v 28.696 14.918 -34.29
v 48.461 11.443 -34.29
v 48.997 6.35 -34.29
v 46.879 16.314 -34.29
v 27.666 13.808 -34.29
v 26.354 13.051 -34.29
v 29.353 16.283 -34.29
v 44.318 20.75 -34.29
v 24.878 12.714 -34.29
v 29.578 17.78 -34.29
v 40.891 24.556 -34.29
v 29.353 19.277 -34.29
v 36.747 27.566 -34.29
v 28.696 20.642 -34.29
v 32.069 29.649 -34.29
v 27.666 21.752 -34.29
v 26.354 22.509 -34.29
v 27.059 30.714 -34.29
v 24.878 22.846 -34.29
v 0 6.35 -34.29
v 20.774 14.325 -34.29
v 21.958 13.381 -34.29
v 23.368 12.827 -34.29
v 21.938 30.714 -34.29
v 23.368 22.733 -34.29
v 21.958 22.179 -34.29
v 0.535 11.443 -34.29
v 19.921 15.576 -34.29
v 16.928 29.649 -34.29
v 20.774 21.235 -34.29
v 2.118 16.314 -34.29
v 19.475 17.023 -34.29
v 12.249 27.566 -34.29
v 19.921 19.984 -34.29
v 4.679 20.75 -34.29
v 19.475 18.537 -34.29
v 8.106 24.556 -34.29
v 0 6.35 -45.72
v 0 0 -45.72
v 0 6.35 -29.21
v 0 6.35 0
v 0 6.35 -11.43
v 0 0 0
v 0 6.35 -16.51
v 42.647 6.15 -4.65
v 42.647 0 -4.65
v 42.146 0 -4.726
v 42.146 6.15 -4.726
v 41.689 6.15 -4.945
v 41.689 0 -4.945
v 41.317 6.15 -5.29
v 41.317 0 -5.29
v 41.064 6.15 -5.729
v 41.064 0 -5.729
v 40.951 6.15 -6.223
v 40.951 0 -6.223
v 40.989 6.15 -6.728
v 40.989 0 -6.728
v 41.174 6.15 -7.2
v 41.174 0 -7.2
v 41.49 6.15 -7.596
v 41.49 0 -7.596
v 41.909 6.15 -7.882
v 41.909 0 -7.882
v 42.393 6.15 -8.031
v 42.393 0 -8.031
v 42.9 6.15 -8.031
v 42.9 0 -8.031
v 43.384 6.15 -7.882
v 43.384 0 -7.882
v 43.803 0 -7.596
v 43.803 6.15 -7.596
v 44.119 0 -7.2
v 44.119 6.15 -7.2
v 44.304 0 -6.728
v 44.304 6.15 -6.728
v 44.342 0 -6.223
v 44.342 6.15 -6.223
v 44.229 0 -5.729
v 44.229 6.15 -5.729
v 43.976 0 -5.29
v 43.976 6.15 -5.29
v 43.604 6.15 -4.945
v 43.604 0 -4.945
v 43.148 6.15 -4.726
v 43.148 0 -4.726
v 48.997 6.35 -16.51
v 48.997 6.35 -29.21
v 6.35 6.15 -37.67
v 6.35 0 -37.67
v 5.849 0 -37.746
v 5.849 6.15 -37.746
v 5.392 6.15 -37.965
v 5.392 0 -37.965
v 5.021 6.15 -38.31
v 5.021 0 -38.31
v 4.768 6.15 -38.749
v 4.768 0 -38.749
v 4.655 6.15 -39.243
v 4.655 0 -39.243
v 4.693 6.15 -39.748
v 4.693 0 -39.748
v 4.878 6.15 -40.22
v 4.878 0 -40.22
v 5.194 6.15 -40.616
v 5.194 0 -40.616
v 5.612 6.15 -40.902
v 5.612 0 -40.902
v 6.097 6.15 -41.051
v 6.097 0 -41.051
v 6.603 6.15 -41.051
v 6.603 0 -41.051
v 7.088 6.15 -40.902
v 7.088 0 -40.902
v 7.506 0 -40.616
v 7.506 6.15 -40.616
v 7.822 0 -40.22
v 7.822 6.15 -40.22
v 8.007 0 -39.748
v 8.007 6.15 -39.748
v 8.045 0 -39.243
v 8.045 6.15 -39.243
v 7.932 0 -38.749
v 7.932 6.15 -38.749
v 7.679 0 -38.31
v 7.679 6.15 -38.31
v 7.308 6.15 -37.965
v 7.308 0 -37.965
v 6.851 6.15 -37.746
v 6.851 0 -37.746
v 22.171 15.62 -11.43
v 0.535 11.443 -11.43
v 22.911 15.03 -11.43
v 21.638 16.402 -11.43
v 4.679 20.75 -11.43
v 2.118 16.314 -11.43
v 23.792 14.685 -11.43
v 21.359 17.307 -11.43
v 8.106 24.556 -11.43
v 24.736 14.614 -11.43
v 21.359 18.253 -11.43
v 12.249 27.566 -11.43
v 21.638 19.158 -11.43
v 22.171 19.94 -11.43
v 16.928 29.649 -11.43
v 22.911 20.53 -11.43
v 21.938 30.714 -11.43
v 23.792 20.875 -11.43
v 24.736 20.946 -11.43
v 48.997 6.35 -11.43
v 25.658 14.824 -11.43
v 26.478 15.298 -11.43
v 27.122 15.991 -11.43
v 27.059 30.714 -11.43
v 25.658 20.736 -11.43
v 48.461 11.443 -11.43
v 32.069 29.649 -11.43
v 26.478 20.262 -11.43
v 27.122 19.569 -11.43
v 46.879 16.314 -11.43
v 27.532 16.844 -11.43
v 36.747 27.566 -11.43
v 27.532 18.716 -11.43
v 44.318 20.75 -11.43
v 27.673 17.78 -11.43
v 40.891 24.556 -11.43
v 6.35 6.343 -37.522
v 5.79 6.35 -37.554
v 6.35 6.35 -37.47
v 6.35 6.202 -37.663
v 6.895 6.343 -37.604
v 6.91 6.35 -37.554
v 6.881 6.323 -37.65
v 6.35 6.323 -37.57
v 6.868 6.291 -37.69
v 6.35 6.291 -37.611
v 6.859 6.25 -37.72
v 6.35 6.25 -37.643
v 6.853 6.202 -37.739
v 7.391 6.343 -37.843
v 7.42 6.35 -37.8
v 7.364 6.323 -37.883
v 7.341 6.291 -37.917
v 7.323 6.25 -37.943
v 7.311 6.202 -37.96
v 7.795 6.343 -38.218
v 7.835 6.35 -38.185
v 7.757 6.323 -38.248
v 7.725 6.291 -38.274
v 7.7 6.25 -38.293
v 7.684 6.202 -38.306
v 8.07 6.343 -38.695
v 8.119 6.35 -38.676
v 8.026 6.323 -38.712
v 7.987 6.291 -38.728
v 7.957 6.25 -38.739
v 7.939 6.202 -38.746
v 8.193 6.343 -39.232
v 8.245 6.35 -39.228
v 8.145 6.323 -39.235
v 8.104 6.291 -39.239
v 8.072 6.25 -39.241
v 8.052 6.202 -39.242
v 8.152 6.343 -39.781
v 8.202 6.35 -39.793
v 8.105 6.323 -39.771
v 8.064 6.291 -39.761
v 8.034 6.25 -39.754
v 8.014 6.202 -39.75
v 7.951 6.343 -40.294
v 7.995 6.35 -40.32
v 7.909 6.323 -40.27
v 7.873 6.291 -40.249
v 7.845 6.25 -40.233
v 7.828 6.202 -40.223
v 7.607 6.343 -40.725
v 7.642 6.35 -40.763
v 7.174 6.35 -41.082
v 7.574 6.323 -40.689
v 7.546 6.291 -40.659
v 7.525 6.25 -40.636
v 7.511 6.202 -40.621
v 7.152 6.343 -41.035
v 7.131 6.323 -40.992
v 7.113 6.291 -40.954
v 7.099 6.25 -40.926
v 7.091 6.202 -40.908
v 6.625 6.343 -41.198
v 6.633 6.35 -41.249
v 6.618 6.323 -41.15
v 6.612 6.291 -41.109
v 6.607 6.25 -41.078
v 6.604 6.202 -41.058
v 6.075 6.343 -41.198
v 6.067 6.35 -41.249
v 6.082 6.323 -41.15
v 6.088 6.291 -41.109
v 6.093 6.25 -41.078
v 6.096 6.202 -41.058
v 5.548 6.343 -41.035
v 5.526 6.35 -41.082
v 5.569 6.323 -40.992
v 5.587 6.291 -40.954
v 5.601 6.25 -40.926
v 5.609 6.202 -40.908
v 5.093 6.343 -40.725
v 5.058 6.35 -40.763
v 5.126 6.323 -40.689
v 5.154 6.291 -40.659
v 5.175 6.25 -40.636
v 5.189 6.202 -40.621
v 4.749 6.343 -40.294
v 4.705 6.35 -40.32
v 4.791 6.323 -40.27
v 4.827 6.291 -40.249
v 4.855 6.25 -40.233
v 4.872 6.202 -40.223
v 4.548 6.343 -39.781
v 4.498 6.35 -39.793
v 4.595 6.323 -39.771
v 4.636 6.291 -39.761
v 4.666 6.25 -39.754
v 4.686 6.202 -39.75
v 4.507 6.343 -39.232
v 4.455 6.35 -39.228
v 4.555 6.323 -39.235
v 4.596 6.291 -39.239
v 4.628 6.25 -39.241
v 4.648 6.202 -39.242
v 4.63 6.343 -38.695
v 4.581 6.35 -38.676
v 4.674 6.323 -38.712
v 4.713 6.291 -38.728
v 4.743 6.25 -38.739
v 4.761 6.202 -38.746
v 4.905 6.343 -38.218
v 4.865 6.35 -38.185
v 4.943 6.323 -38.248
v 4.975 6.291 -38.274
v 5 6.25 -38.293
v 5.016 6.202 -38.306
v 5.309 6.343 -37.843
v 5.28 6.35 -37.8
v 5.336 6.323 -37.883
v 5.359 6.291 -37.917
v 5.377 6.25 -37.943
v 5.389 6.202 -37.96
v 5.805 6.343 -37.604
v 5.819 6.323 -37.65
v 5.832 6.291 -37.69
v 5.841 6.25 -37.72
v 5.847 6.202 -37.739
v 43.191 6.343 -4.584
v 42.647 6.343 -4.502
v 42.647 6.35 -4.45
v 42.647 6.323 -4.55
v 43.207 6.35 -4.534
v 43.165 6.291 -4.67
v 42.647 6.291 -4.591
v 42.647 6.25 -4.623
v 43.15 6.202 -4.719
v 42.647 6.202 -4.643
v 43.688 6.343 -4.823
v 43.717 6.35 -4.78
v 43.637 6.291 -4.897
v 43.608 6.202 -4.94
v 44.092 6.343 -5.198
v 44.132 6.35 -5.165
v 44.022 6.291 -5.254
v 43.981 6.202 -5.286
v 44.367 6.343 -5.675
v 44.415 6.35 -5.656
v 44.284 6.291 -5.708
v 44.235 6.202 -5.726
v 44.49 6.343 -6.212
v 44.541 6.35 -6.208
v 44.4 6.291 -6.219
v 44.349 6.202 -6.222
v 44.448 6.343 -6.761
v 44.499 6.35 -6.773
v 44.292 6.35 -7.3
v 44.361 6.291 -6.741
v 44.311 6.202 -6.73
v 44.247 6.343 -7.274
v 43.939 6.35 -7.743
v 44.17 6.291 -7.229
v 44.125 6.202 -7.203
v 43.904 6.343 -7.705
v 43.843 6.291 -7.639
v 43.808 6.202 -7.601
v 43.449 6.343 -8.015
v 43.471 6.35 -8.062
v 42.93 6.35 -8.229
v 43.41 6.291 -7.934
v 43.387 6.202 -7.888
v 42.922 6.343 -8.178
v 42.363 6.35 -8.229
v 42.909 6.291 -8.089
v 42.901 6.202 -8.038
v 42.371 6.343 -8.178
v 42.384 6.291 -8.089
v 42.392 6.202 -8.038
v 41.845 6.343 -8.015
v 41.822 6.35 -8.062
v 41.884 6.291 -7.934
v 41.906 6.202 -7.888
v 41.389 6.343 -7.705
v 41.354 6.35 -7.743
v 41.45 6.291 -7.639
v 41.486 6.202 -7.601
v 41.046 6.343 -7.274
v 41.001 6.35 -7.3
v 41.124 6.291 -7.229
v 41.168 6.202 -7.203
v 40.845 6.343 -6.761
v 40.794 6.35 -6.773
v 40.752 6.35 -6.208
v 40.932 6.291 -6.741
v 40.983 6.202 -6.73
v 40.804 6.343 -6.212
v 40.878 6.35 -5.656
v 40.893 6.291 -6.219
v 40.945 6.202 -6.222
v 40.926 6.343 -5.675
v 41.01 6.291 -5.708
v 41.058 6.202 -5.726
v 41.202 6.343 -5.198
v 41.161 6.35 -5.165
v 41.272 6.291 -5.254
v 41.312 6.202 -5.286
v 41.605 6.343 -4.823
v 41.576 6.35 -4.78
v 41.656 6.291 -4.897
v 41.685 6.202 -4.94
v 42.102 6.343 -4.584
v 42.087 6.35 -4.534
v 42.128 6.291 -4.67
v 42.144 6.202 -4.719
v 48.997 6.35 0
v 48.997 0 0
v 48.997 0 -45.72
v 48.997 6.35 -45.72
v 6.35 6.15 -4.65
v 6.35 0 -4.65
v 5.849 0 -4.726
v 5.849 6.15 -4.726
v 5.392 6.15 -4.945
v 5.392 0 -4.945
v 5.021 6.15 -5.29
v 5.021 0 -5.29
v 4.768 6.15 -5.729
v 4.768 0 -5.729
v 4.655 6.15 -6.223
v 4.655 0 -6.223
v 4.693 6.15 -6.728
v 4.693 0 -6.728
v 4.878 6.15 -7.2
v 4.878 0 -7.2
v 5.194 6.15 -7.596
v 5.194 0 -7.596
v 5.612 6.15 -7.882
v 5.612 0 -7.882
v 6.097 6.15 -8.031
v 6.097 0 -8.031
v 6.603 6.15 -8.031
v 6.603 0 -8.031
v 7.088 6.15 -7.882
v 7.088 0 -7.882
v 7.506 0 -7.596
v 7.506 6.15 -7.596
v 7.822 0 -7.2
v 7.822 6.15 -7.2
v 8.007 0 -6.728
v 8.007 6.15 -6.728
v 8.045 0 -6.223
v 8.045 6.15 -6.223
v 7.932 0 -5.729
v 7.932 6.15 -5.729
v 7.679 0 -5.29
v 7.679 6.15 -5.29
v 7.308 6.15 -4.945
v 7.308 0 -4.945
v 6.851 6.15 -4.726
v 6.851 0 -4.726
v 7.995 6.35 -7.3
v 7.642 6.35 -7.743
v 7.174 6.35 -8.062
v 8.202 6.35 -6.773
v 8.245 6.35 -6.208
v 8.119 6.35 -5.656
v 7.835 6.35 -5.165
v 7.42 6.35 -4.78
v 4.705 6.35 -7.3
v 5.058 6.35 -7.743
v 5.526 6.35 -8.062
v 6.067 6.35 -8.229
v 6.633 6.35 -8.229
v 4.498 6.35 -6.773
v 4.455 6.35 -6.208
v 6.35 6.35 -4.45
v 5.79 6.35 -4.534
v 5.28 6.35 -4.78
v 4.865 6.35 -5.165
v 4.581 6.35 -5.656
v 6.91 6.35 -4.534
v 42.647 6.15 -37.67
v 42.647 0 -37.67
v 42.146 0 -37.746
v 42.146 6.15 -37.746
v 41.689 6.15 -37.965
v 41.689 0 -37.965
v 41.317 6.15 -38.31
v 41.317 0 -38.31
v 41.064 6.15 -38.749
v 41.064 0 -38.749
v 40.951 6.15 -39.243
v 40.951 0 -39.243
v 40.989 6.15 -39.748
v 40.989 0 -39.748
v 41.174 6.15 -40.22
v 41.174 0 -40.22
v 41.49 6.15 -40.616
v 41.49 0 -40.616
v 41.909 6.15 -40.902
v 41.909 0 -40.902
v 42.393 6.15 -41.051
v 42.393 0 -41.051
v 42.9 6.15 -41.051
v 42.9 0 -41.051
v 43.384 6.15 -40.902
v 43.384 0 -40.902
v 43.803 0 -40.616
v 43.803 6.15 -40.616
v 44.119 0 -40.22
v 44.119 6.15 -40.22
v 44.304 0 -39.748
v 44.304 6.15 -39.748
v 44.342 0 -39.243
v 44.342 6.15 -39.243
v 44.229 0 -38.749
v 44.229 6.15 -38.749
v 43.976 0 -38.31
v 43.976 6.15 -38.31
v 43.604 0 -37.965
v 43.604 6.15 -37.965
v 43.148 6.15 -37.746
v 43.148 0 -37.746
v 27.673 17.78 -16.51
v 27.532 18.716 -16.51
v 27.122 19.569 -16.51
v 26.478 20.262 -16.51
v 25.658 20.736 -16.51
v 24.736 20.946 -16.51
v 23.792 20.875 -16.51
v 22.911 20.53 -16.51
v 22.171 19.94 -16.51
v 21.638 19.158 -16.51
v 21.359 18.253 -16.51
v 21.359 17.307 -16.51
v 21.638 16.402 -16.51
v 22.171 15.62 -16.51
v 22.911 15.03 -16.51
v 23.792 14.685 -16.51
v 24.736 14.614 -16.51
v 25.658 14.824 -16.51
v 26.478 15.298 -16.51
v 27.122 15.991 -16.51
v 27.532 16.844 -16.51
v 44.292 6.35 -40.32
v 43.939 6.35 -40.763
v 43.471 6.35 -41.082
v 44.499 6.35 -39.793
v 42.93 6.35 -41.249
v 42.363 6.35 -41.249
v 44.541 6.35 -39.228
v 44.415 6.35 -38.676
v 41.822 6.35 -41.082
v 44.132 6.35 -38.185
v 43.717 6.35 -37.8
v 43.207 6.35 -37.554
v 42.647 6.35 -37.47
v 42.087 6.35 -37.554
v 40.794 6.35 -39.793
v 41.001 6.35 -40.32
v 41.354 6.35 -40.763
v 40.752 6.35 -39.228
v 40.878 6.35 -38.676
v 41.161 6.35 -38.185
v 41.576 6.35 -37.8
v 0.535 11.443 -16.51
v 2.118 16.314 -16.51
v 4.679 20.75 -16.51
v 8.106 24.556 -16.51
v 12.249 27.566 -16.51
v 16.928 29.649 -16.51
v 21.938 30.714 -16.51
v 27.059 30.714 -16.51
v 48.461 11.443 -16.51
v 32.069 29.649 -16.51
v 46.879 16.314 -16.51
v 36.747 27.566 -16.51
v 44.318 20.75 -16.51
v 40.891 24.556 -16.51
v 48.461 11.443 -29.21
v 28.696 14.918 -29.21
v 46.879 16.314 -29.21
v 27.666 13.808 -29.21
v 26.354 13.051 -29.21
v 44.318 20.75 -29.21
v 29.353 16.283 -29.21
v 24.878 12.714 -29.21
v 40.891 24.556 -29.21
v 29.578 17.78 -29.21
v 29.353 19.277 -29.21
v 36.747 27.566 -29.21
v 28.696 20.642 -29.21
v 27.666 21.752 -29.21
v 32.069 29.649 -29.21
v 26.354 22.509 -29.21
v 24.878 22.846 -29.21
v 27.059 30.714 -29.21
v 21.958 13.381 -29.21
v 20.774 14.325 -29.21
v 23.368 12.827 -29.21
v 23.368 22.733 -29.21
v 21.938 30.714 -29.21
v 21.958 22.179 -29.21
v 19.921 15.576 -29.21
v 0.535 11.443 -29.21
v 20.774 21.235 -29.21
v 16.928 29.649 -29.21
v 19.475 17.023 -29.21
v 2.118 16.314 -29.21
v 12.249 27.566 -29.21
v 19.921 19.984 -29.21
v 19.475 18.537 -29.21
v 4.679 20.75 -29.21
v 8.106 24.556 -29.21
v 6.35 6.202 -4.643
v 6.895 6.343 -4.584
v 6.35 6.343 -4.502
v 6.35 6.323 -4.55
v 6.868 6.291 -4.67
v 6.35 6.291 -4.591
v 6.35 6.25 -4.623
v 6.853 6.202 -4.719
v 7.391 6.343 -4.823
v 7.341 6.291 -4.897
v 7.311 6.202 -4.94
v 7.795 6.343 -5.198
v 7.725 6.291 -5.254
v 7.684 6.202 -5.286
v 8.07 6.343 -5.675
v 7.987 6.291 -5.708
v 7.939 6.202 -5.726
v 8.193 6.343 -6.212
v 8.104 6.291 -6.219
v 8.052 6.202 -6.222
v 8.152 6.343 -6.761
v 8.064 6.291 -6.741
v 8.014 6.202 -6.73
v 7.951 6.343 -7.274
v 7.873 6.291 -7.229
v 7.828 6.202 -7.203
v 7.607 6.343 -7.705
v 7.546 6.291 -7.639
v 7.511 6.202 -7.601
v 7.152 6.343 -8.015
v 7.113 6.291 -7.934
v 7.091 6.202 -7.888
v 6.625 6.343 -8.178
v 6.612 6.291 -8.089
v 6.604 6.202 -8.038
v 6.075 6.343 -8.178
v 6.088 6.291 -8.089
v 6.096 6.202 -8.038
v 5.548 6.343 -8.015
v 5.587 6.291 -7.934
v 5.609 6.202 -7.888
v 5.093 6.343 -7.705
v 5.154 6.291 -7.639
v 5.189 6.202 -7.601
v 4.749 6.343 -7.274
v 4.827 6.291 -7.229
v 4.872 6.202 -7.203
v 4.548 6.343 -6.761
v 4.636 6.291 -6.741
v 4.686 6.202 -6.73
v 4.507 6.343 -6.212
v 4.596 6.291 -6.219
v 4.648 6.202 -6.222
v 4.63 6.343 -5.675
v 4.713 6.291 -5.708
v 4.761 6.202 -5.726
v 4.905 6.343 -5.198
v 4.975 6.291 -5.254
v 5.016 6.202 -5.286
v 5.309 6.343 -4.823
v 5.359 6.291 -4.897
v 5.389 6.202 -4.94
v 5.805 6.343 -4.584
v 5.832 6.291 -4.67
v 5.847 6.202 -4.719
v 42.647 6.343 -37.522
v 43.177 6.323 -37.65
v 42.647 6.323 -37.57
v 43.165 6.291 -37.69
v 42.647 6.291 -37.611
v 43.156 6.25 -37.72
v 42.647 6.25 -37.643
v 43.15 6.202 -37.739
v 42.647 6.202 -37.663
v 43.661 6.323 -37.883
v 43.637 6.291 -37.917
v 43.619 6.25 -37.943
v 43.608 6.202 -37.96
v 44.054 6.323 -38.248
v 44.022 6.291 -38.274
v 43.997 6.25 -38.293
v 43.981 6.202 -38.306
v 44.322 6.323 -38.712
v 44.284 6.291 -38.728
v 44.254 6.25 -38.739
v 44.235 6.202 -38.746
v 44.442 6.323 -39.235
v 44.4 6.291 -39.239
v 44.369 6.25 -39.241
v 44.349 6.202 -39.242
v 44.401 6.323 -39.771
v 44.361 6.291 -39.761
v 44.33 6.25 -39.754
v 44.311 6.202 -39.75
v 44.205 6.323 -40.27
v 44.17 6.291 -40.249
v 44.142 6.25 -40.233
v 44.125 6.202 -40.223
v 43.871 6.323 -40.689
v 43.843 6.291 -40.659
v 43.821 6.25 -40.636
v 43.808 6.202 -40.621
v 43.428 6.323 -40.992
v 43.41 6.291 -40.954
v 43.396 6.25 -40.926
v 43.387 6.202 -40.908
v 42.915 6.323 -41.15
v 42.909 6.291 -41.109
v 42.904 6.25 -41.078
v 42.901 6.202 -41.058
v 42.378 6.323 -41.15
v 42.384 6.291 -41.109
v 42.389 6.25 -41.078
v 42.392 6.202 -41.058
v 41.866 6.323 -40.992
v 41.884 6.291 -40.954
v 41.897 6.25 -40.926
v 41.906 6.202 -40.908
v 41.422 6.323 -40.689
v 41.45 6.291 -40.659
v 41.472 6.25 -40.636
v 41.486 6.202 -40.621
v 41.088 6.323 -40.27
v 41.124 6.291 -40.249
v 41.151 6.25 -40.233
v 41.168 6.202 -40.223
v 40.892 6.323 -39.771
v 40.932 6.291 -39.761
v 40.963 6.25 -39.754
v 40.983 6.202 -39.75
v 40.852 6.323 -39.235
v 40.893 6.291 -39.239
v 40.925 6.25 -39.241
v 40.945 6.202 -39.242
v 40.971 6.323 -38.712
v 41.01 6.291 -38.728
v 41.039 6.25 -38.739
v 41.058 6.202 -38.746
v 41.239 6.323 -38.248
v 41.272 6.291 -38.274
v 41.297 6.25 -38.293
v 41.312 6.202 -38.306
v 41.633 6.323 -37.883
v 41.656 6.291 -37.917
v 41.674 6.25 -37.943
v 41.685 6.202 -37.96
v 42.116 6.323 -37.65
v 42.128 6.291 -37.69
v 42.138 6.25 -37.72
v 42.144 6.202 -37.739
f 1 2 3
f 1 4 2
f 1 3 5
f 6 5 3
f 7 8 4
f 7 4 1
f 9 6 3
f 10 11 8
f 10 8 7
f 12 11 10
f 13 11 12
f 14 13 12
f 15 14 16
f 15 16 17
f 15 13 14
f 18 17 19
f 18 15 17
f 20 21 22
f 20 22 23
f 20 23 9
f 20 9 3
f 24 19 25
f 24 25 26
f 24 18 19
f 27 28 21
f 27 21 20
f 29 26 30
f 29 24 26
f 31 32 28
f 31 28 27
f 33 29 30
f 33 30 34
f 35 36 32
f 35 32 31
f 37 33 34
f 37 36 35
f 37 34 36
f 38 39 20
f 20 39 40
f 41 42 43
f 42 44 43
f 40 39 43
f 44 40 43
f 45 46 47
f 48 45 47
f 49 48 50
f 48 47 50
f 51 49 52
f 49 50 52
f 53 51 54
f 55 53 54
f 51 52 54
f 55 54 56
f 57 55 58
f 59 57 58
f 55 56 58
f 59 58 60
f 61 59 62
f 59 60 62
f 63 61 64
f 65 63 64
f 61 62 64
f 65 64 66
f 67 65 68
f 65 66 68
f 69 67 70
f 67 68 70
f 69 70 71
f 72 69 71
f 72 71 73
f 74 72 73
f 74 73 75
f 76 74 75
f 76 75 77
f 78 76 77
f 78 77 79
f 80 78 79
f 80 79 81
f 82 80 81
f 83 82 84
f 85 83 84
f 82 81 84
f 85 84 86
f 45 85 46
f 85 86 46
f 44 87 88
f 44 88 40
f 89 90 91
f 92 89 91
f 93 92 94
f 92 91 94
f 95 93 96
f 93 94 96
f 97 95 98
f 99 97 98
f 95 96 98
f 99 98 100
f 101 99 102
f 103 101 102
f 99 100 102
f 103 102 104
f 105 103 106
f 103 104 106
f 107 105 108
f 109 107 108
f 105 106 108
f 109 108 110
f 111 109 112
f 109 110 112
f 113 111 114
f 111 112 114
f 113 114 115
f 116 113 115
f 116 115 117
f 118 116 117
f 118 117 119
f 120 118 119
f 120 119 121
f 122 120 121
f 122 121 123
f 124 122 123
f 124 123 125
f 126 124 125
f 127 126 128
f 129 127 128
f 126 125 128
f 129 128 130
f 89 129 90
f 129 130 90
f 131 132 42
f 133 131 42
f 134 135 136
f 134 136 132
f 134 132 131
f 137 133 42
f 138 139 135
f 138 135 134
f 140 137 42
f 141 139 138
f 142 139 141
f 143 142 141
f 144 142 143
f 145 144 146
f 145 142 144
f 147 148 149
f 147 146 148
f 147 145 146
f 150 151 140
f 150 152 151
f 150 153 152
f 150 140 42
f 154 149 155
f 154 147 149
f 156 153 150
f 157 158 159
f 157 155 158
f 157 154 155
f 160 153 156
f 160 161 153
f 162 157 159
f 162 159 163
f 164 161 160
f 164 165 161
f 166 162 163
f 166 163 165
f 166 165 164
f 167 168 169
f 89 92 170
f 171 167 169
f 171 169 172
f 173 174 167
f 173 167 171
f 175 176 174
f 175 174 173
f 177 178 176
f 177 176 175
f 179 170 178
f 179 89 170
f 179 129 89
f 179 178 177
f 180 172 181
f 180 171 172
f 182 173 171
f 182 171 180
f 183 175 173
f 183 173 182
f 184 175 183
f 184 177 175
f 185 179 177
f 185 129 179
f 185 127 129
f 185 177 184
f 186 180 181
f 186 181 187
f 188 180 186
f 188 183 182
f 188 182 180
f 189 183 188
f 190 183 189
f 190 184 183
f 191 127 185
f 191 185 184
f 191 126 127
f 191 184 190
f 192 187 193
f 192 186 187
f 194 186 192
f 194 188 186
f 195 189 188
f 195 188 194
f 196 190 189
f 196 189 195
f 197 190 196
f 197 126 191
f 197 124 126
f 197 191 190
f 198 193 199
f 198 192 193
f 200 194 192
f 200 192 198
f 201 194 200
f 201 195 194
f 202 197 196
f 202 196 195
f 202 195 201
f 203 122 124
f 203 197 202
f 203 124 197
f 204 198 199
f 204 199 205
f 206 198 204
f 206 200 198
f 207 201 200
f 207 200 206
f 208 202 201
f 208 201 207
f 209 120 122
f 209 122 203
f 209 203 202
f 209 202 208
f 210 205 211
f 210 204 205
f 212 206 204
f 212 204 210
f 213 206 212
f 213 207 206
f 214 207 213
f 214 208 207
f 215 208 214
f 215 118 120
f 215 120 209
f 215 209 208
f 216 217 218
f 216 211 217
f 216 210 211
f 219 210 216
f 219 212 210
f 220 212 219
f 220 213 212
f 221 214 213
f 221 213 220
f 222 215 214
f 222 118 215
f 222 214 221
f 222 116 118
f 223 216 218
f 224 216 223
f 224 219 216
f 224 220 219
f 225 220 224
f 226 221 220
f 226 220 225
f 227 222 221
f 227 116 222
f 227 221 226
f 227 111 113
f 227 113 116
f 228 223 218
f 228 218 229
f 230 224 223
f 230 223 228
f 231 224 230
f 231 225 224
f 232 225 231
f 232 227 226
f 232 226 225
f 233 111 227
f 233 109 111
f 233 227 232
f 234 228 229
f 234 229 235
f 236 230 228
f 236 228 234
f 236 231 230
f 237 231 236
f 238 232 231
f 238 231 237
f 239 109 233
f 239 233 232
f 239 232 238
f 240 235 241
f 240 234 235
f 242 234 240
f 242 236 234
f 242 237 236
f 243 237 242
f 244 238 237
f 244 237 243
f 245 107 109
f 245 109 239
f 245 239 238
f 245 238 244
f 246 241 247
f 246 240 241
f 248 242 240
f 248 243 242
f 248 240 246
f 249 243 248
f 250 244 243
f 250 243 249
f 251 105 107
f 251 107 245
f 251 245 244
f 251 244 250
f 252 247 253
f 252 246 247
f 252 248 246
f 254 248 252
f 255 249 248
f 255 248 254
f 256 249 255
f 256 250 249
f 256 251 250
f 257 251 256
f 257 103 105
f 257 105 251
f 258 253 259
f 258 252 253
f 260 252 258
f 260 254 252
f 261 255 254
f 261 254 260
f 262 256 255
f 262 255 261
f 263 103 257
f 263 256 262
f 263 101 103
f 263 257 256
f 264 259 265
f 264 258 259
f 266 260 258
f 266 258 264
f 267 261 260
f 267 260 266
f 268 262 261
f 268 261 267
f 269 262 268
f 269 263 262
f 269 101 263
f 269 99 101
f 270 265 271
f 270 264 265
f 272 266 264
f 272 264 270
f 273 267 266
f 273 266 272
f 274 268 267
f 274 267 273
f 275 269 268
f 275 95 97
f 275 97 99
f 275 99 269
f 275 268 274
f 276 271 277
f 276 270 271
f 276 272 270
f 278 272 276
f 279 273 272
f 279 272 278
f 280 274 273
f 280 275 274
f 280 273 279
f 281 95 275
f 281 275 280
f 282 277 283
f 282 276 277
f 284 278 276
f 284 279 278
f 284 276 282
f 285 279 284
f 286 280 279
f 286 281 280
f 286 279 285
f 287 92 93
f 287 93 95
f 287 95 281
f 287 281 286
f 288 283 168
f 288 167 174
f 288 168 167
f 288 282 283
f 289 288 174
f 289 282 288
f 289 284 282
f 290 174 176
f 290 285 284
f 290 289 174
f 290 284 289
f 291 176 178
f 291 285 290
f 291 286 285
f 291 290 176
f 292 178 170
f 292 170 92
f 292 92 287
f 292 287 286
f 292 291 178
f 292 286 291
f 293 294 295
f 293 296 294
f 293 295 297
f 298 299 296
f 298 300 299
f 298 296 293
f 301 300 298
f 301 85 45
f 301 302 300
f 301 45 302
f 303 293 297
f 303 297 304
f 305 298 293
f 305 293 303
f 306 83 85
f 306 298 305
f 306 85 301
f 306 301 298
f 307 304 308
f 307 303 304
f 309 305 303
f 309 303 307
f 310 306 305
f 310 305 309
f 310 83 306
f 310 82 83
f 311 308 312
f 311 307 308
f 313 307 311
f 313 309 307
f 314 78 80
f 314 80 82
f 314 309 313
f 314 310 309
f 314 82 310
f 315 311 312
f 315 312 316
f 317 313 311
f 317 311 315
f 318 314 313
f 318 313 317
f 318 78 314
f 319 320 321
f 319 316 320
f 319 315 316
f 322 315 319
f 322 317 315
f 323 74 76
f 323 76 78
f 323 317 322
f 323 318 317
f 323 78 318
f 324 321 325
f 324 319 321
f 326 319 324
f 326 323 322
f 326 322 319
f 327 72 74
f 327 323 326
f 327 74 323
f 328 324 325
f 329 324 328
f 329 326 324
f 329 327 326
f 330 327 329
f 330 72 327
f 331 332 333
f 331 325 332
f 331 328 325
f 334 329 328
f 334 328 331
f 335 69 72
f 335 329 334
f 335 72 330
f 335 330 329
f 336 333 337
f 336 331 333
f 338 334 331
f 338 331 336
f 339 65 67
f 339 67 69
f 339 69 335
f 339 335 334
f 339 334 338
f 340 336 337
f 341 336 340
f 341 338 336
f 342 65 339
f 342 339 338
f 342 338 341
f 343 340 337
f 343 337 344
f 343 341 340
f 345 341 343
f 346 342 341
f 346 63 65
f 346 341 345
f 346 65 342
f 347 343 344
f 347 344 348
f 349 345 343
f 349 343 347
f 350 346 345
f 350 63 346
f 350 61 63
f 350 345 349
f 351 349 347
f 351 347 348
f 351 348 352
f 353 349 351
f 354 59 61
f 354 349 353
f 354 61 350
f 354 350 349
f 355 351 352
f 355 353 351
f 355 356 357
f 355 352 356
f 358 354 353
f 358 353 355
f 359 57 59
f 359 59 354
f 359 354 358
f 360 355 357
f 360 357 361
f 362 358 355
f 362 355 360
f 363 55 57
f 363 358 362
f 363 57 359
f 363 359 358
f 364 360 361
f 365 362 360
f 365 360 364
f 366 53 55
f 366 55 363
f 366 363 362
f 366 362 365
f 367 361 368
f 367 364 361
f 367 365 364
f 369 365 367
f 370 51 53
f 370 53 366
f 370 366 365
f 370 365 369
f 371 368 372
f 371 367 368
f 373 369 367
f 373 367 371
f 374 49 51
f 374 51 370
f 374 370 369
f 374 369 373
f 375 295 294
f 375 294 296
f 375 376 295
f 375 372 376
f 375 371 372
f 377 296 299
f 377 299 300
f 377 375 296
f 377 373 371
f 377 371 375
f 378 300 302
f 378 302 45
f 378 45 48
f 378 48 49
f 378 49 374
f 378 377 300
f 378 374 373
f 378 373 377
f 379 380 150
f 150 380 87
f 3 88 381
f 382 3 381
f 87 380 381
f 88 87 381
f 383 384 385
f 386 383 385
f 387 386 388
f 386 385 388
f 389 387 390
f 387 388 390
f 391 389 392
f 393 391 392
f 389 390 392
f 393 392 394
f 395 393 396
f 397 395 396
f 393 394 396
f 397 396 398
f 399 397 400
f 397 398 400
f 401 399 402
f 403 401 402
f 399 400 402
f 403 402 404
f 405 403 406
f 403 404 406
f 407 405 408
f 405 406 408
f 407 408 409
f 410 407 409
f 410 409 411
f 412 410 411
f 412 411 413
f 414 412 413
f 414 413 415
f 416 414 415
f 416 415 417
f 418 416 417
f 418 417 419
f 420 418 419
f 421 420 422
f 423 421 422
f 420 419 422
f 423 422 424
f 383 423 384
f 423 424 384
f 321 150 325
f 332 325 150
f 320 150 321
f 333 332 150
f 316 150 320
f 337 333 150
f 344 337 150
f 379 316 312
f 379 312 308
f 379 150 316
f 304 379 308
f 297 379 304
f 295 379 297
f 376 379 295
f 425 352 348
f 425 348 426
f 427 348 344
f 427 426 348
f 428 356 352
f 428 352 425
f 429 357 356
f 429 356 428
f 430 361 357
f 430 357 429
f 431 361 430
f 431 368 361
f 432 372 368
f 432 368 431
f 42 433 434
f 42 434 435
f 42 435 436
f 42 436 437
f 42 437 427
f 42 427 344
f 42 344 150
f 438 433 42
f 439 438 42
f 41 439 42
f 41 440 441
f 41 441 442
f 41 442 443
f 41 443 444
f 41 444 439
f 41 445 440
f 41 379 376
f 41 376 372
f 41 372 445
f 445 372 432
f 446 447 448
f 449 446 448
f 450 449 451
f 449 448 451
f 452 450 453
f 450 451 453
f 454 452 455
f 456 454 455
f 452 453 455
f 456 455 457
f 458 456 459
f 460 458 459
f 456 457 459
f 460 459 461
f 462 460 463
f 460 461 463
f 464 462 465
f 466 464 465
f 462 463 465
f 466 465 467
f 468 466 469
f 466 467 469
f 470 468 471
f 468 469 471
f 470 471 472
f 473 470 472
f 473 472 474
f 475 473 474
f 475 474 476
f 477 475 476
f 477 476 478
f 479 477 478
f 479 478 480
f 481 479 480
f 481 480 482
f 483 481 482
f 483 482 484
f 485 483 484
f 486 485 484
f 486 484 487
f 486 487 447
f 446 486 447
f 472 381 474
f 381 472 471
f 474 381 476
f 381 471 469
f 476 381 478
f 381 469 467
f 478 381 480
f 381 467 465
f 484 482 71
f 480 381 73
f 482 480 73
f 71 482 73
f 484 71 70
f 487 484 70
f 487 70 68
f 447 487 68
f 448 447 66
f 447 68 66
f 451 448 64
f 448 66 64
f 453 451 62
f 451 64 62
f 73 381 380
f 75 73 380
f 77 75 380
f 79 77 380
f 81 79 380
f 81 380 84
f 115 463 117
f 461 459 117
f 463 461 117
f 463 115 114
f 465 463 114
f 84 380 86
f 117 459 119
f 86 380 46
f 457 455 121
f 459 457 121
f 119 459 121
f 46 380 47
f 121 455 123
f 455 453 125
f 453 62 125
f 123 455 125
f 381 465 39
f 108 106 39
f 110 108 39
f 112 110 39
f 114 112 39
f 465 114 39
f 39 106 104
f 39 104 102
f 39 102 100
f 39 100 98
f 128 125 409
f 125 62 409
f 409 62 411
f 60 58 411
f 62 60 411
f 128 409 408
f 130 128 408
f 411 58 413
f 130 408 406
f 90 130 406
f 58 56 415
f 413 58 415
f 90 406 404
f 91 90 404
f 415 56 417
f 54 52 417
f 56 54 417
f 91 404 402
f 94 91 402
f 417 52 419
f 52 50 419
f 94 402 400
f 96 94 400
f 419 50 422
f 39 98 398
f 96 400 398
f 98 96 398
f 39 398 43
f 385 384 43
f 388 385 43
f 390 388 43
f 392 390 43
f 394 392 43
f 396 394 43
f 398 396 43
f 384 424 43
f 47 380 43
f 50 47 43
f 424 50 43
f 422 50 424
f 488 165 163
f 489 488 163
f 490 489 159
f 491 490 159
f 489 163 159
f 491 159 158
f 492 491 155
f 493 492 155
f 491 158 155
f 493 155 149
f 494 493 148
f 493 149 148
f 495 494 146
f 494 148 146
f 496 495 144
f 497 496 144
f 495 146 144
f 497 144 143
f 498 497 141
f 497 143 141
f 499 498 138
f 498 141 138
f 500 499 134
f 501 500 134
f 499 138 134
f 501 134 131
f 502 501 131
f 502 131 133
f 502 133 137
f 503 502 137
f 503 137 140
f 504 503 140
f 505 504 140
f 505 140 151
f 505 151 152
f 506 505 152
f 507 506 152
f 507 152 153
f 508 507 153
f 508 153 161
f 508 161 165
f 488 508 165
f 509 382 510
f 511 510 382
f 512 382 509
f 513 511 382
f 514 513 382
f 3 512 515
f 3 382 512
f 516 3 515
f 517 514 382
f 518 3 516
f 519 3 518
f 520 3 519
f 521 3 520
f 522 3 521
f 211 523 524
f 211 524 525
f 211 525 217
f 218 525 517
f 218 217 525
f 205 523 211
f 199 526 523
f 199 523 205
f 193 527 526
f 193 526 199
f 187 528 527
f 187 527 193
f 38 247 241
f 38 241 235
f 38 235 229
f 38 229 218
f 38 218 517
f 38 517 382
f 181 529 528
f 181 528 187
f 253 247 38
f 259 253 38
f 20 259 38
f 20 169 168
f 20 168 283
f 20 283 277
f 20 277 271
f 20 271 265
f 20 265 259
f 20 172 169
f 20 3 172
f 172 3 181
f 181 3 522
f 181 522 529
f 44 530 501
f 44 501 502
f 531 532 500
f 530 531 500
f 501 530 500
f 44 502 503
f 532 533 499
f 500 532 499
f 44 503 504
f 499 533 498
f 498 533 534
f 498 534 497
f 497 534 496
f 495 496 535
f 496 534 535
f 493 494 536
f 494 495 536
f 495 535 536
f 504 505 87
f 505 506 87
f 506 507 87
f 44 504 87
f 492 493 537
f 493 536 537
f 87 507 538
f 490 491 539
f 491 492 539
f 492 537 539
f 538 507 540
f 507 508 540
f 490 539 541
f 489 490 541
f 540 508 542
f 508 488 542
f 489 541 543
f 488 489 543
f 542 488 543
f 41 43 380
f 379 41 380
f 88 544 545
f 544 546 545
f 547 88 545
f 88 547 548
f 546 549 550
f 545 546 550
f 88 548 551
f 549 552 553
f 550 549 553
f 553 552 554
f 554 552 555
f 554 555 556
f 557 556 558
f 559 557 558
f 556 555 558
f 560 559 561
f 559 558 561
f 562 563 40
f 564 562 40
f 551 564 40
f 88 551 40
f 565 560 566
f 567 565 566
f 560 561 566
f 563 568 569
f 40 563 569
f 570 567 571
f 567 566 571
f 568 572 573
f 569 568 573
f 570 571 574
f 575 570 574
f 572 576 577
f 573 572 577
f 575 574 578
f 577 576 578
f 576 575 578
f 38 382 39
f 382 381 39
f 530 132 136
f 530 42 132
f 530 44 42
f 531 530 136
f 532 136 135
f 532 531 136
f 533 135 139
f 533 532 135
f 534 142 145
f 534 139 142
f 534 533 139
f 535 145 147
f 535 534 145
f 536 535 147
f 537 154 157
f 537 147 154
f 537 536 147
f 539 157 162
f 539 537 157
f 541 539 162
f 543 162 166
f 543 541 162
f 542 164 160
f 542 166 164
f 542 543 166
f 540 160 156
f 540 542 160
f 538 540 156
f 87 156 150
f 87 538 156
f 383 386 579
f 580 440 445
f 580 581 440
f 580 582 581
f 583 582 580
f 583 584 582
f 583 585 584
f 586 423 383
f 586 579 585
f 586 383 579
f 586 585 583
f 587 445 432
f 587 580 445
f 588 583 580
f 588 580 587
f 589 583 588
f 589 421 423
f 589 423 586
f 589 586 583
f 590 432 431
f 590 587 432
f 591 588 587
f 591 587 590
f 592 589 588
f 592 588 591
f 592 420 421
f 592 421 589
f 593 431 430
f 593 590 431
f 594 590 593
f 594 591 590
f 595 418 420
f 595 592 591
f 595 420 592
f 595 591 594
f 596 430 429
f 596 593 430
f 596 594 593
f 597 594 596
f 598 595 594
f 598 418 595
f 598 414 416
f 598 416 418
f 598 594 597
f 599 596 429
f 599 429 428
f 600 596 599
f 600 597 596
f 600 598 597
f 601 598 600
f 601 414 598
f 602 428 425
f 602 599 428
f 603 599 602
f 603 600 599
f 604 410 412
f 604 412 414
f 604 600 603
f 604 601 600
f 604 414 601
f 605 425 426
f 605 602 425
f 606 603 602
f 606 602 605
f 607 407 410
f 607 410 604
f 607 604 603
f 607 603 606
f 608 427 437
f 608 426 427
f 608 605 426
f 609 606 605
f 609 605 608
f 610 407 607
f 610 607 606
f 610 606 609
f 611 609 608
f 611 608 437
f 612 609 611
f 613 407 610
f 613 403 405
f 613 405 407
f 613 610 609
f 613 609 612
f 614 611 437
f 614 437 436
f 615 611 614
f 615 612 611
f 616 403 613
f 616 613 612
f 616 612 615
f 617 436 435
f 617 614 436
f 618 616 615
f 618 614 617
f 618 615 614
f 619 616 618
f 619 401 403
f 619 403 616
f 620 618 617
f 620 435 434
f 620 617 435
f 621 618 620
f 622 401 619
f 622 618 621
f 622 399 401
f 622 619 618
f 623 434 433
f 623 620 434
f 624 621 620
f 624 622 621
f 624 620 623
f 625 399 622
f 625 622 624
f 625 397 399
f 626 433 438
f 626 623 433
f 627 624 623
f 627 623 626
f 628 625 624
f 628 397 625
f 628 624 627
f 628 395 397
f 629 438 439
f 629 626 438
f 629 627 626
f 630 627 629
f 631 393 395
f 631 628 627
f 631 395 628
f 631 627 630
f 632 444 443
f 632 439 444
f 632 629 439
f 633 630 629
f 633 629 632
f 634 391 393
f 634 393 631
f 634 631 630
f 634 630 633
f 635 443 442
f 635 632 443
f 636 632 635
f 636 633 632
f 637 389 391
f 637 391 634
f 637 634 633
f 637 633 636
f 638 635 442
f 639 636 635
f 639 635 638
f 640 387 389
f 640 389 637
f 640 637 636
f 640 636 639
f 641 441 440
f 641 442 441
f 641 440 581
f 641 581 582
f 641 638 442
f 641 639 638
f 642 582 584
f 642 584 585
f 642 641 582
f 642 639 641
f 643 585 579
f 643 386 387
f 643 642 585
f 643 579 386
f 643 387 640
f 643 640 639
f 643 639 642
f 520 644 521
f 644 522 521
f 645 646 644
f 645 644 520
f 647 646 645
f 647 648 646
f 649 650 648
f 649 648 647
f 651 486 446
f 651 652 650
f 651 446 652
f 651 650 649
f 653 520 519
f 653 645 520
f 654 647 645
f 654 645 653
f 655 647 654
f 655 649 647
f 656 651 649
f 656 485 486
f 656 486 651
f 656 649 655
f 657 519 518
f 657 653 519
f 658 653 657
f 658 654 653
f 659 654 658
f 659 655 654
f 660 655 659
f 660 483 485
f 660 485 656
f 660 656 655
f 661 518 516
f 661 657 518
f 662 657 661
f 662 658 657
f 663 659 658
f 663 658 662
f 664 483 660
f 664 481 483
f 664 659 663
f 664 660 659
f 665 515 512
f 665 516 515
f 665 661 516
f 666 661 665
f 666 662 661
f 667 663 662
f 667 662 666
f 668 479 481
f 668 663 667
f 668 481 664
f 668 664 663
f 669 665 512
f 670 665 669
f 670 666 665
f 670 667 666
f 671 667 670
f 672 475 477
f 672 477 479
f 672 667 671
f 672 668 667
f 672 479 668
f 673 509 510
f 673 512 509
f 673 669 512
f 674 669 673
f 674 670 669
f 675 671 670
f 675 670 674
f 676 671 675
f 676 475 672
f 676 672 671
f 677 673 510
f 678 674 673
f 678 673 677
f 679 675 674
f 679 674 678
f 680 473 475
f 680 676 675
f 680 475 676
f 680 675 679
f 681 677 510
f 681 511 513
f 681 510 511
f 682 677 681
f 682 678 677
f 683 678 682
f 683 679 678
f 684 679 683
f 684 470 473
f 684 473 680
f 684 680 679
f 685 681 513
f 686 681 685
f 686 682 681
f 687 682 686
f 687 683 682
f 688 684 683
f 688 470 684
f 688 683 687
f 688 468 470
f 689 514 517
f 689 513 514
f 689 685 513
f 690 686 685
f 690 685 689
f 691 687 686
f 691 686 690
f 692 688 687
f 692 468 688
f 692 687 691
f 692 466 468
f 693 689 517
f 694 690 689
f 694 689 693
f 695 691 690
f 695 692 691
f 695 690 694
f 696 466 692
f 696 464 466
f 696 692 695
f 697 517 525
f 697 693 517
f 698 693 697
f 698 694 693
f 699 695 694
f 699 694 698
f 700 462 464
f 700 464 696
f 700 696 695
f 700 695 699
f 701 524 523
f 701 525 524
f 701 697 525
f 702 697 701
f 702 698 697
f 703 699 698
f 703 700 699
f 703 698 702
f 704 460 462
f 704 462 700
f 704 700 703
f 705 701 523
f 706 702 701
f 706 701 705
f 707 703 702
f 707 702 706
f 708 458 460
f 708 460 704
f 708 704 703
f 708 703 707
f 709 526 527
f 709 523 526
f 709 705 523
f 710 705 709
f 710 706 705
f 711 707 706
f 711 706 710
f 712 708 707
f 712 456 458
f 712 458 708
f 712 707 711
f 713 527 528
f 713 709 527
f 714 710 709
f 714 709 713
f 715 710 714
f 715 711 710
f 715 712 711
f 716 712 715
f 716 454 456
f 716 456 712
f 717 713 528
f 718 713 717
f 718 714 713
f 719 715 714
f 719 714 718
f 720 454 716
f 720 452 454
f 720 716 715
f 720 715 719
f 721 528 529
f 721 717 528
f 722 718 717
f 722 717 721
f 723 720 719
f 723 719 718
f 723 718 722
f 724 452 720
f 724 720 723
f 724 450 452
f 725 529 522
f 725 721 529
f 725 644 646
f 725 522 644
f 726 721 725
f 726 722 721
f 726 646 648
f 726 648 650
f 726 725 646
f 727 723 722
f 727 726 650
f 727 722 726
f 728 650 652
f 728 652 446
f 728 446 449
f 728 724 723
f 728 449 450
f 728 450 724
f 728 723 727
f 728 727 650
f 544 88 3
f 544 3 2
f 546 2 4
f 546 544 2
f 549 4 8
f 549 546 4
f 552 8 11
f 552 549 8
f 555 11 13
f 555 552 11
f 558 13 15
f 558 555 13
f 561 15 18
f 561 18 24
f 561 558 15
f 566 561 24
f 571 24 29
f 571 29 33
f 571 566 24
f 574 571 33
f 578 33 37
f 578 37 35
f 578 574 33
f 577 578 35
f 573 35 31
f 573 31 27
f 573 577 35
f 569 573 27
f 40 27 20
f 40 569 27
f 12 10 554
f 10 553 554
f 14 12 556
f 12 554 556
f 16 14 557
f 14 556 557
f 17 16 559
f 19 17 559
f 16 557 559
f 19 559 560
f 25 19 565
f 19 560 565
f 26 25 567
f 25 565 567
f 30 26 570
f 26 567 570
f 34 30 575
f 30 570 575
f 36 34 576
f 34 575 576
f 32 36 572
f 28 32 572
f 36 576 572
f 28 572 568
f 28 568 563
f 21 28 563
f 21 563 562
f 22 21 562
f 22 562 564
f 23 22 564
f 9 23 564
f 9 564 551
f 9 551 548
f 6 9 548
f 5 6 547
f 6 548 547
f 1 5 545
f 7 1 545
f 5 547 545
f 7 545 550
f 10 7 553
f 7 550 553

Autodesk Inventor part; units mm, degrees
ref_plane "YZ Plane" through (0, 0, 0) normal (1, 0, 0) x (0, 1, 0)
sketch "Sketch1" plane through (0, 0, 0) normal (0, 1, 0) x (-1, 0, 0)
  line L0 (0, 0) -> (-48.9966, 0)
  line L1 (-48.9966, 0) -> (-48.9966, -45.72)
  line L2 (-48.9966, -45.72) -> (0, -45.72)
  line L3 (0, -45.72) -> (0, 0)
  dimension "d0" = 48.9966
  dimension "d1" = 45.72
extrude "Extrusion1" add sketch "Sketch1" along normal blind 6.35
sketch "Sketch3" plane through (0, 6.35, 0) normal (0, 1, 0) x (1, 0, 0)
  line L0 (0, 45.72) -> (0, 0) projected
  line L1 (48.9966, 0) -> (48.9966, 45.72) projected
  line L2 (0, 29.21) -> (48.9966, 29.21)
  line L3 (48.9966, 29.21) -> (48.9966, 16.51)
  line L4 (48.9966, 16.51) -> (0, 16.51)
  line L5 (0, 16.51) -> (0, 29.21)
  line L6 (48.9966, 45.72) -> (0, 45.72) projected
  dimension "d4" = 12.7
  dimension "d5" = 16.51
sketch "Sketch4" plane through (0, 6.35, 0) normal (0, 1, 0) x (1, 0, 0)
  circle A0 centre (6.35, 39.37) radius 2.1364
  circle A1 centre (42.6466, 39.37) radius 3.0733
  line L0 (48.9966, 45.72) -> (0, 45.72) projected
  line L1 (48.9966, 0) -> (48.9966, 45.72) projected
  line L2 (0, 45.72) -> (0, 0) projected
  circle A2 centre (6.35, 6.35) radius 2.2799
  circle A3 centre (42.6466, 6.35) radius 1.194
  line L3 (0, 0) -> (48.9966, 0) projected
  dimension "d6" = 6.1465
  dimension "d7" = 6.35
  dimension "d8" = 6.35
  dimension "d9" = 6.35
  dimension "d10" = 6.35
  dimension "d11" = 6.35
  dimension "d12" = 6.35
  dimension "d13" = 6.35
  dimension "d14" = 6.35
hole "Hole1" at (6.35, 6.35, -39.37) at (42.6466, 6.35, -39.37) at (42.6466, 6.35, -6.35) at (6.35, 6.35, -6.35) direction (0, -1, 0) diameter 3.4 depth 10 tip angle 118 clearance for "Socket Head Cap Screw" size "M3" standard "Ansi Metric M Profile"
fillet "Fillet1" radius 0.2 4 edges at (42.6466, 6.35, -41.07) (6.35, 6.35, -41.07) (42.6466, 6.35, -8.05) (6.35, 6.35, -8.05)
ref_plane "Work Plane1" through (0, 0, -16.51) normal (0, 0, 1) x (1, 0, 0)
sketch "Sketch5" plane through (0, 0, -16.51) normal (0, 0, 1) x (1, 0, 0)
  line L0 (0, 6.35) -> (48.9966, 6.35)
  line L1 (48.9966, 6.35) -> (0, 6.35) projected
  arc A0 (48.9966, 6.35) -> (0, 6.35) centre (24.4983, 6.35) ccw
  point P0 (0, 0)
extrude "Extrusion2" add sketch "Sketch5" along normal blind 5.08
ref_plane "Work Plane2" through (0, 0, -22.86) normal (0, 0, 1) x (1, 0, 0)
mirror "Mirror1" about plane through (0, 0, -22.86) normal (0, 0, 1) of "Extrusion2"
sketch "Sketch6" plane through (0, 0, -11.43) normal (0, 0, 1) x (1, 0, 0)
  circle A0 centre (24.4983, 17.78) radius 3.175
  line L0 (0, 6.35) -> (48.9966, 6.35) projected
  point P0 (0, 0)
  point P1 (24.4983, 6.35)
  point P2 (24.4983, 6.35)
  dimension "d27" = 11.43
  dimension "d28" = 6.35
extrude "Extrusion3" cut sketch "Sketch6" against normal up to surface (5.08 mm away)
sketch "Sketch8" plane through (24.4983, 6.35, -29.21) normal (0, 0, 1) x (1, 0, 0)
  circle A0 centre (0, 11.43) radius 3.175 projected
  circle A1 centre (0, 11.43) radius 5.08
  point P0 (-24.4983, -6.35)
  dimension "d34" = 10.16
extrude "Extrusion5" cut sketch "Sketch8" against normal blind 25.4 contours A0 | A1
properties part number "Carriage Top" material "Aluminum 6061"
